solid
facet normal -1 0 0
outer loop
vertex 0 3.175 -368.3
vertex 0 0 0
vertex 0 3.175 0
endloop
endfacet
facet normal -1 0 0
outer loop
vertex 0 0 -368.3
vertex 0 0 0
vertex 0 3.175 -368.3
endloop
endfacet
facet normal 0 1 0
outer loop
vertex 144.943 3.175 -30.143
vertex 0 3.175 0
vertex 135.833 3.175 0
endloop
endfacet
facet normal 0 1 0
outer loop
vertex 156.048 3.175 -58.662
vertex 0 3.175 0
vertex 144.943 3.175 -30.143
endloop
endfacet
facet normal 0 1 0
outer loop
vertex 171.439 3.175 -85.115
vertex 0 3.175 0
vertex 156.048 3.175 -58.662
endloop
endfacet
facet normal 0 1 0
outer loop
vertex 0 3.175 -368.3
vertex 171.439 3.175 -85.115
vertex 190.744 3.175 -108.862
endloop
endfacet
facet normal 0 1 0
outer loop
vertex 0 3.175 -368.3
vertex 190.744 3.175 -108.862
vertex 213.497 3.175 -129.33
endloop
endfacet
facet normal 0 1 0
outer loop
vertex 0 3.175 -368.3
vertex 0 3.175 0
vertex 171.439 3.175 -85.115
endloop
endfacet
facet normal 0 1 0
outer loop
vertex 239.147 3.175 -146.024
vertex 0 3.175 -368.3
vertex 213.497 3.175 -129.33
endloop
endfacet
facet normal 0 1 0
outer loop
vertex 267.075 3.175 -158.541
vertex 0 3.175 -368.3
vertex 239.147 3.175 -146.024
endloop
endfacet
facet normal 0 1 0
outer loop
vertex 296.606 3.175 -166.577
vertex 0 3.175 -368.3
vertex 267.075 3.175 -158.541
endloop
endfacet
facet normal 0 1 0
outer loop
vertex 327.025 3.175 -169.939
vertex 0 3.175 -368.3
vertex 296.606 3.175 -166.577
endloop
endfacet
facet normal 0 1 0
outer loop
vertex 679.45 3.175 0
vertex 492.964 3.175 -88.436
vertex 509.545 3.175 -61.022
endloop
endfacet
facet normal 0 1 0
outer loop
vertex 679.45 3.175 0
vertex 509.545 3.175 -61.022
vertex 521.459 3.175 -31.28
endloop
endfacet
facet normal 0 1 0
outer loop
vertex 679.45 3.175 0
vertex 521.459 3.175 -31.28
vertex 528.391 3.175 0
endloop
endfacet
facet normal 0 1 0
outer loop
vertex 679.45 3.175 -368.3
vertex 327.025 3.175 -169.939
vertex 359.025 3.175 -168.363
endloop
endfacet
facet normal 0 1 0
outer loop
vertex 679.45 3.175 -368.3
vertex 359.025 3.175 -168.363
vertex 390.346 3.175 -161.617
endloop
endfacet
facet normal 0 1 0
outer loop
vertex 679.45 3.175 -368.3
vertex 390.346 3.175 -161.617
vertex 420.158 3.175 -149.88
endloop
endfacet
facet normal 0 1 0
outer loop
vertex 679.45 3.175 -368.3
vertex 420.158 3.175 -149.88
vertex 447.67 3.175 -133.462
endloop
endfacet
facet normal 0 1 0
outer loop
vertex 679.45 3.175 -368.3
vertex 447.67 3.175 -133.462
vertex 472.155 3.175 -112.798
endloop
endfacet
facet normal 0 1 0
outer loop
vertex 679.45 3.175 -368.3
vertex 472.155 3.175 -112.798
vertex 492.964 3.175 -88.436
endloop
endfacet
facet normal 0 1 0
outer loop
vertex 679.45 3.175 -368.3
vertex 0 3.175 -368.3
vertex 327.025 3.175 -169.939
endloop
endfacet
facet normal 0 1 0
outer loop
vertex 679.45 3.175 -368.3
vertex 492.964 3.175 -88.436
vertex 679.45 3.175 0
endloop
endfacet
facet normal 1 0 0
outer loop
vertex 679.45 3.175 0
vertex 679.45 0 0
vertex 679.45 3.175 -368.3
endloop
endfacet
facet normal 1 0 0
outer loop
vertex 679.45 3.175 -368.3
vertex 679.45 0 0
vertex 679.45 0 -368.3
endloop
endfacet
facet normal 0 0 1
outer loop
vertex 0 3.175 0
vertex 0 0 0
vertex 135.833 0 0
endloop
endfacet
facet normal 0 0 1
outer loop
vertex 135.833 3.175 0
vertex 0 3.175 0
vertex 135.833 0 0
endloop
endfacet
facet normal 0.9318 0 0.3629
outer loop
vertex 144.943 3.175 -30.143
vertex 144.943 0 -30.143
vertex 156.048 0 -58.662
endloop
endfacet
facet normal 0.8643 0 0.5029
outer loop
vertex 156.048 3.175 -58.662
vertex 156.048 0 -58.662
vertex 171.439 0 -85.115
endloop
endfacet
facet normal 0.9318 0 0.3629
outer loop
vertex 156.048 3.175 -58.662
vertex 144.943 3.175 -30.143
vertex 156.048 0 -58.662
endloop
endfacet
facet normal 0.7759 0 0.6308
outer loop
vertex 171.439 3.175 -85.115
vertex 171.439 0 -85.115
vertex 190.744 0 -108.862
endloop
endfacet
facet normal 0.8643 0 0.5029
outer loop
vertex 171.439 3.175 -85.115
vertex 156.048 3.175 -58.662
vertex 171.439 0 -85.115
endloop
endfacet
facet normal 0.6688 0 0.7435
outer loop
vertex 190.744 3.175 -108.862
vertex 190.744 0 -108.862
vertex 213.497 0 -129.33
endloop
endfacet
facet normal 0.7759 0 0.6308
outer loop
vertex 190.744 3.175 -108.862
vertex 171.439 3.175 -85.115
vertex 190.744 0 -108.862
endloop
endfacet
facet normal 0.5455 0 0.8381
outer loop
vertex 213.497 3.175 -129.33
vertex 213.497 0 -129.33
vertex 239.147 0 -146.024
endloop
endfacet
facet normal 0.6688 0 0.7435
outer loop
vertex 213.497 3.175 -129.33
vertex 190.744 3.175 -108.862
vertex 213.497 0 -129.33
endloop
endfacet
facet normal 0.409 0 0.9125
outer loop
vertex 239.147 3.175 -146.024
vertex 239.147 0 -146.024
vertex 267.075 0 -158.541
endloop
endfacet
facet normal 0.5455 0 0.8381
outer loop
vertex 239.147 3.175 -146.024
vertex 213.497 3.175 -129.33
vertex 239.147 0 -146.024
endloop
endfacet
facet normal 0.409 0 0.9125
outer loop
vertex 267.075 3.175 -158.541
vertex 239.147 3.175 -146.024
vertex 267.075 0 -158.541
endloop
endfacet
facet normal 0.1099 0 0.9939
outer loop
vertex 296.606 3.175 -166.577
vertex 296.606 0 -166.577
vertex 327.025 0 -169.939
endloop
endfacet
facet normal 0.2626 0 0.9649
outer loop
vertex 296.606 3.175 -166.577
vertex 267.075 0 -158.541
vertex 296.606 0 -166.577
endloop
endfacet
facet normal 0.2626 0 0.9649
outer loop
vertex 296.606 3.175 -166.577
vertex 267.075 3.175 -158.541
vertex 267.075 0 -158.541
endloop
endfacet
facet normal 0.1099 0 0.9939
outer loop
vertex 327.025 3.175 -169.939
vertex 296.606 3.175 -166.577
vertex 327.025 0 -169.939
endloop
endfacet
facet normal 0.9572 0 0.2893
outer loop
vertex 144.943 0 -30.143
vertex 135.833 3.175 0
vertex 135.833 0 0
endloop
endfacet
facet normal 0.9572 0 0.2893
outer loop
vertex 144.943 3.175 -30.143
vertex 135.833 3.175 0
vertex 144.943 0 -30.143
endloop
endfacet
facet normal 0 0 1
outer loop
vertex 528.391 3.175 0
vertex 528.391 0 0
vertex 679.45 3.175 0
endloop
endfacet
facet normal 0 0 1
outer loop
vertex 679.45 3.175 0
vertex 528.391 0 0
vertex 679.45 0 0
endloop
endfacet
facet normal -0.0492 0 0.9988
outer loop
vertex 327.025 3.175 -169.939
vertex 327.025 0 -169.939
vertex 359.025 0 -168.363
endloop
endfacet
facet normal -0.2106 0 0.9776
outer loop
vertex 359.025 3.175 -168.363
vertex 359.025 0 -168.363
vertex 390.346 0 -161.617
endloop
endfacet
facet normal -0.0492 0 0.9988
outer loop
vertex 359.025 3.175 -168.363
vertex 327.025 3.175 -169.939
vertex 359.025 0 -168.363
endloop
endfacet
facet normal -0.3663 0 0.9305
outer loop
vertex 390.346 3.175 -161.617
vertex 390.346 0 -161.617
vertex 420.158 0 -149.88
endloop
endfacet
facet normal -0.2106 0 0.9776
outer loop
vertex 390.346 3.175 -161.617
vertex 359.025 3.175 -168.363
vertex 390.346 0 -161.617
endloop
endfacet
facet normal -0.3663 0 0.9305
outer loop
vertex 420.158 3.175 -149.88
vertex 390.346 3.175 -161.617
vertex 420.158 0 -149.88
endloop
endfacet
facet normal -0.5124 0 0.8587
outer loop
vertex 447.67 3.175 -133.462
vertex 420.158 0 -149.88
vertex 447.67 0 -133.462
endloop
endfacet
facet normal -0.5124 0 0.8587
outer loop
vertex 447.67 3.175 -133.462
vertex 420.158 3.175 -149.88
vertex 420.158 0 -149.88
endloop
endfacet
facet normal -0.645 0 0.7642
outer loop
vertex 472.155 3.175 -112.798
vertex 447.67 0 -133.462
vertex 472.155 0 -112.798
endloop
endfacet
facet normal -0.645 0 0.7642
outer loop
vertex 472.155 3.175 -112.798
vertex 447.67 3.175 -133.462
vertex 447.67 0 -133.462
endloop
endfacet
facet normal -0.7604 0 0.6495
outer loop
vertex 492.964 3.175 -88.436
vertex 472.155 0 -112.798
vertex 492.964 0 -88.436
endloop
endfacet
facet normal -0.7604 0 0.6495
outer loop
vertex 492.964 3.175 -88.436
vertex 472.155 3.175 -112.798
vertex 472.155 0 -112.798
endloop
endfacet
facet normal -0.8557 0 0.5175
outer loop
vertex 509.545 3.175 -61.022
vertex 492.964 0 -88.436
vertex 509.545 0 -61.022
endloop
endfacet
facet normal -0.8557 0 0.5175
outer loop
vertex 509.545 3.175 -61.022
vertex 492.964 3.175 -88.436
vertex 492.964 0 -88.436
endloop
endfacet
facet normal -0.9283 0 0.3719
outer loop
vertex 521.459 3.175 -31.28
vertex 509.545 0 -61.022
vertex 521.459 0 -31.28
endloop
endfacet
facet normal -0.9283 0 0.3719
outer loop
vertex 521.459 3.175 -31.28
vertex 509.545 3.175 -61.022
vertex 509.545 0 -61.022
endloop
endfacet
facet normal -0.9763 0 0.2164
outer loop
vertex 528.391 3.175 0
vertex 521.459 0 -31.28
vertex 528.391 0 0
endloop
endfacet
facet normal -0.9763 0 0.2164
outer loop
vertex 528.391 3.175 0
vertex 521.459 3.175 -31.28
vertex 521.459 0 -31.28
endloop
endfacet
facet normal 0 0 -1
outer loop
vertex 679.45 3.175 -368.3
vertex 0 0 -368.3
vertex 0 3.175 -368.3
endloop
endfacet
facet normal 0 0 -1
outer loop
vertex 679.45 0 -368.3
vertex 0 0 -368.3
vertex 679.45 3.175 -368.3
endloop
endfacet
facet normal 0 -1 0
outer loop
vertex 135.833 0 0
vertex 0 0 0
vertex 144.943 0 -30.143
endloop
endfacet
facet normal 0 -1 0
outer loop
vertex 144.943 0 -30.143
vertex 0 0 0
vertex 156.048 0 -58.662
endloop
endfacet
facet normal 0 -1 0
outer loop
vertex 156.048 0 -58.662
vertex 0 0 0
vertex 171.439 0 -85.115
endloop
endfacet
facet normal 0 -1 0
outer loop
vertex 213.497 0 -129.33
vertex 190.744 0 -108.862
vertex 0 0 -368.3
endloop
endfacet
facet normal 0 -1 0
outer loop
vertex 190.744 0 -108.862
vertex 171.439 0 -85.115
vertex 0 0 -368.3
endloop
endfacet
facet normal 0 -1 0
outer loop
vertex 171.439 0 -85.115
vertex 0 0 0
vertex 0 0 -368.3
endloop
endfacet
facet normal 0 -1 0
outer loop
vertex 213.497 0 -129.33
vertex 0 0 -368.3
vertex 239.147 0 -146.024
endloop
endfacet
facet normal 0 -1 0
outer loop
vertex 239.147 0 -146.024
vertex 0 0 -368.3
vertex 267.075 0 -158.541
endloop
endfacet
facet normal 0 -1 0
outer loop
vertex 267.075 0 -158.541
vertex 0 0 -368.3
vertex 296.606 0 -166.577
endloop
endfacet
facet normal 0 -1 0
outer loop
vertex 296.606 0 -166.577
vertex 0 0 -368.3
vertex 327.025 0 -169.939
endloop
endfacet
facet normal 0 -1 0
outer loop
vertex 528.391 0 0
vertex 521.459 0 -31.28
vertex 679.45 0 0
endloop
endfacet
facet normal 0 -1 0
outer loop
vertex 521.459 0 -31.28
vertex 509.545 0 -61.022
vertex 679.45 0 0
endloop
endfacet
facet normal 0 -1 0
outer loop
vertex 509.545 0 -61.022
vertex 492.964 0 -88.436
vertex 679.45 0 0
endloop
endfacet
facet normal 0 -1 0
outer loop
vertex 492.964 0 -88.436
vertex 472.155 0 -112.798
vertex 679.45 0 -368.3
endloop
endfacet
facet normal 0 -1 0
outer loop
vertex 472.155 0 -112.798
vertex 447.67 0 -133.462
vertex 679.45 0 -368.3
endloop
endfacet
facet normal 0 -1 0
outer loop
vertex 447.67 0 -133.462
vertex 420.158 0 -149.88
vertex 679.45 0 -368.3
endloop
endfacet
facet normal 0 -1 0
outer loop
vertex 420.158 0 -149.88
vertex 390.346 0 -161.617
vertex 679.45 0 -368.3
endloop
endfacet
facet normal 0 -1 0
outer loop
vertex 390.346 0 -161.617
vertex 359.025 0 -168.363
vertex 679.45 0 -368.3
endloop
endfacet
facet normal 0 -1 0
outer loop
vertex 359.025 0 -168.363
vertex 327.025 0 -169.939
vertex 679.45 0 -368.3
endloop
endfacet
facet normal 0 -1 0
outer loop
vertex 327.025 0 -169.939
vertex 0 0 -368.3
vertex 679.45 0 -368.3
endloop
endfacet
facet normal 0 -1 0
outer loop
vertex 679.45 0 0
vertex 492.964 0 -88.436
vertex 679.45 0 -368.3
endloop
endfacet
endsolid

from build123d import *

# Parameters (mm, degrees)
SKETCH1_W           = 679.45
SKETCH1_H           = 368.3
BOSS_EXTRUDE1_DEPTH = 3.175
CUT_EXTRUDE1_DEPTH  = 4.175


with BuildPart() as part:
    # Sketch1 → Boss-Extrude1 (new body)
    with BuildSketch(Plane(origin=(0, 0, 0), x_dir=(1, 0, 0), z_dir=(0, 1, 0))):
        with Locations((339.725, 184.15)):
            Rectangle(SKETCH1_W, SKETCH1_H)
    extrude(amount=BOSS_EXTRUDE1_DEPTH)

    # Sketch2 → Cut-Extrude1 (cut, through all)
    with BuildSketch(Plane(origin=(0, 3.175, 0), x_dir=(1, 0, 0), z_dir=(0, 1, 0))):
        with BuildLine():
            Line((135.832993334, 0), (144.943397545, 30.143073778))
            ThreePointArc((144.943397545, 30.143073778), (213.497085422, 129.330172419), (327.025, 169.939300333))
            ThreePointArc((327.025, 169.939300333), (472.568969877, 112.385716223), (530.122553987, -33.158253654))
            ThreePointArc((530.122553987, -33.158253654), (520.134888885, -89.022933623), (494.625079918, -139.71677515))
            add(Edge.make_bspline(
                [(494.625079918, -139.71677515), (493.45726691, -141.384584969), (490.895198527, -144.528294755), (484.77915912, -150.233837552), (475.335730084, -156.231610738), (461.521693133, -161.444305371), (379.648366594, -177.46097032), (267.722400389, -112.187788034), (488.667649379, 0)],
                knots=[0, 0, 0, 0, 0.027722316, 0.055444633, 0.110889265, 0.166333898, 0.22177853, 0.984715491, 0.984715491, 0.984715491, 0.984715491], degree=3))
            Line((488.667649379, 0), (135.832993334, 0))
        make_face()
    extrude(amount=-CUT_EXTRUDE1_DEPTH, mode=Mode.SUBTRACT)


solid = part.part
